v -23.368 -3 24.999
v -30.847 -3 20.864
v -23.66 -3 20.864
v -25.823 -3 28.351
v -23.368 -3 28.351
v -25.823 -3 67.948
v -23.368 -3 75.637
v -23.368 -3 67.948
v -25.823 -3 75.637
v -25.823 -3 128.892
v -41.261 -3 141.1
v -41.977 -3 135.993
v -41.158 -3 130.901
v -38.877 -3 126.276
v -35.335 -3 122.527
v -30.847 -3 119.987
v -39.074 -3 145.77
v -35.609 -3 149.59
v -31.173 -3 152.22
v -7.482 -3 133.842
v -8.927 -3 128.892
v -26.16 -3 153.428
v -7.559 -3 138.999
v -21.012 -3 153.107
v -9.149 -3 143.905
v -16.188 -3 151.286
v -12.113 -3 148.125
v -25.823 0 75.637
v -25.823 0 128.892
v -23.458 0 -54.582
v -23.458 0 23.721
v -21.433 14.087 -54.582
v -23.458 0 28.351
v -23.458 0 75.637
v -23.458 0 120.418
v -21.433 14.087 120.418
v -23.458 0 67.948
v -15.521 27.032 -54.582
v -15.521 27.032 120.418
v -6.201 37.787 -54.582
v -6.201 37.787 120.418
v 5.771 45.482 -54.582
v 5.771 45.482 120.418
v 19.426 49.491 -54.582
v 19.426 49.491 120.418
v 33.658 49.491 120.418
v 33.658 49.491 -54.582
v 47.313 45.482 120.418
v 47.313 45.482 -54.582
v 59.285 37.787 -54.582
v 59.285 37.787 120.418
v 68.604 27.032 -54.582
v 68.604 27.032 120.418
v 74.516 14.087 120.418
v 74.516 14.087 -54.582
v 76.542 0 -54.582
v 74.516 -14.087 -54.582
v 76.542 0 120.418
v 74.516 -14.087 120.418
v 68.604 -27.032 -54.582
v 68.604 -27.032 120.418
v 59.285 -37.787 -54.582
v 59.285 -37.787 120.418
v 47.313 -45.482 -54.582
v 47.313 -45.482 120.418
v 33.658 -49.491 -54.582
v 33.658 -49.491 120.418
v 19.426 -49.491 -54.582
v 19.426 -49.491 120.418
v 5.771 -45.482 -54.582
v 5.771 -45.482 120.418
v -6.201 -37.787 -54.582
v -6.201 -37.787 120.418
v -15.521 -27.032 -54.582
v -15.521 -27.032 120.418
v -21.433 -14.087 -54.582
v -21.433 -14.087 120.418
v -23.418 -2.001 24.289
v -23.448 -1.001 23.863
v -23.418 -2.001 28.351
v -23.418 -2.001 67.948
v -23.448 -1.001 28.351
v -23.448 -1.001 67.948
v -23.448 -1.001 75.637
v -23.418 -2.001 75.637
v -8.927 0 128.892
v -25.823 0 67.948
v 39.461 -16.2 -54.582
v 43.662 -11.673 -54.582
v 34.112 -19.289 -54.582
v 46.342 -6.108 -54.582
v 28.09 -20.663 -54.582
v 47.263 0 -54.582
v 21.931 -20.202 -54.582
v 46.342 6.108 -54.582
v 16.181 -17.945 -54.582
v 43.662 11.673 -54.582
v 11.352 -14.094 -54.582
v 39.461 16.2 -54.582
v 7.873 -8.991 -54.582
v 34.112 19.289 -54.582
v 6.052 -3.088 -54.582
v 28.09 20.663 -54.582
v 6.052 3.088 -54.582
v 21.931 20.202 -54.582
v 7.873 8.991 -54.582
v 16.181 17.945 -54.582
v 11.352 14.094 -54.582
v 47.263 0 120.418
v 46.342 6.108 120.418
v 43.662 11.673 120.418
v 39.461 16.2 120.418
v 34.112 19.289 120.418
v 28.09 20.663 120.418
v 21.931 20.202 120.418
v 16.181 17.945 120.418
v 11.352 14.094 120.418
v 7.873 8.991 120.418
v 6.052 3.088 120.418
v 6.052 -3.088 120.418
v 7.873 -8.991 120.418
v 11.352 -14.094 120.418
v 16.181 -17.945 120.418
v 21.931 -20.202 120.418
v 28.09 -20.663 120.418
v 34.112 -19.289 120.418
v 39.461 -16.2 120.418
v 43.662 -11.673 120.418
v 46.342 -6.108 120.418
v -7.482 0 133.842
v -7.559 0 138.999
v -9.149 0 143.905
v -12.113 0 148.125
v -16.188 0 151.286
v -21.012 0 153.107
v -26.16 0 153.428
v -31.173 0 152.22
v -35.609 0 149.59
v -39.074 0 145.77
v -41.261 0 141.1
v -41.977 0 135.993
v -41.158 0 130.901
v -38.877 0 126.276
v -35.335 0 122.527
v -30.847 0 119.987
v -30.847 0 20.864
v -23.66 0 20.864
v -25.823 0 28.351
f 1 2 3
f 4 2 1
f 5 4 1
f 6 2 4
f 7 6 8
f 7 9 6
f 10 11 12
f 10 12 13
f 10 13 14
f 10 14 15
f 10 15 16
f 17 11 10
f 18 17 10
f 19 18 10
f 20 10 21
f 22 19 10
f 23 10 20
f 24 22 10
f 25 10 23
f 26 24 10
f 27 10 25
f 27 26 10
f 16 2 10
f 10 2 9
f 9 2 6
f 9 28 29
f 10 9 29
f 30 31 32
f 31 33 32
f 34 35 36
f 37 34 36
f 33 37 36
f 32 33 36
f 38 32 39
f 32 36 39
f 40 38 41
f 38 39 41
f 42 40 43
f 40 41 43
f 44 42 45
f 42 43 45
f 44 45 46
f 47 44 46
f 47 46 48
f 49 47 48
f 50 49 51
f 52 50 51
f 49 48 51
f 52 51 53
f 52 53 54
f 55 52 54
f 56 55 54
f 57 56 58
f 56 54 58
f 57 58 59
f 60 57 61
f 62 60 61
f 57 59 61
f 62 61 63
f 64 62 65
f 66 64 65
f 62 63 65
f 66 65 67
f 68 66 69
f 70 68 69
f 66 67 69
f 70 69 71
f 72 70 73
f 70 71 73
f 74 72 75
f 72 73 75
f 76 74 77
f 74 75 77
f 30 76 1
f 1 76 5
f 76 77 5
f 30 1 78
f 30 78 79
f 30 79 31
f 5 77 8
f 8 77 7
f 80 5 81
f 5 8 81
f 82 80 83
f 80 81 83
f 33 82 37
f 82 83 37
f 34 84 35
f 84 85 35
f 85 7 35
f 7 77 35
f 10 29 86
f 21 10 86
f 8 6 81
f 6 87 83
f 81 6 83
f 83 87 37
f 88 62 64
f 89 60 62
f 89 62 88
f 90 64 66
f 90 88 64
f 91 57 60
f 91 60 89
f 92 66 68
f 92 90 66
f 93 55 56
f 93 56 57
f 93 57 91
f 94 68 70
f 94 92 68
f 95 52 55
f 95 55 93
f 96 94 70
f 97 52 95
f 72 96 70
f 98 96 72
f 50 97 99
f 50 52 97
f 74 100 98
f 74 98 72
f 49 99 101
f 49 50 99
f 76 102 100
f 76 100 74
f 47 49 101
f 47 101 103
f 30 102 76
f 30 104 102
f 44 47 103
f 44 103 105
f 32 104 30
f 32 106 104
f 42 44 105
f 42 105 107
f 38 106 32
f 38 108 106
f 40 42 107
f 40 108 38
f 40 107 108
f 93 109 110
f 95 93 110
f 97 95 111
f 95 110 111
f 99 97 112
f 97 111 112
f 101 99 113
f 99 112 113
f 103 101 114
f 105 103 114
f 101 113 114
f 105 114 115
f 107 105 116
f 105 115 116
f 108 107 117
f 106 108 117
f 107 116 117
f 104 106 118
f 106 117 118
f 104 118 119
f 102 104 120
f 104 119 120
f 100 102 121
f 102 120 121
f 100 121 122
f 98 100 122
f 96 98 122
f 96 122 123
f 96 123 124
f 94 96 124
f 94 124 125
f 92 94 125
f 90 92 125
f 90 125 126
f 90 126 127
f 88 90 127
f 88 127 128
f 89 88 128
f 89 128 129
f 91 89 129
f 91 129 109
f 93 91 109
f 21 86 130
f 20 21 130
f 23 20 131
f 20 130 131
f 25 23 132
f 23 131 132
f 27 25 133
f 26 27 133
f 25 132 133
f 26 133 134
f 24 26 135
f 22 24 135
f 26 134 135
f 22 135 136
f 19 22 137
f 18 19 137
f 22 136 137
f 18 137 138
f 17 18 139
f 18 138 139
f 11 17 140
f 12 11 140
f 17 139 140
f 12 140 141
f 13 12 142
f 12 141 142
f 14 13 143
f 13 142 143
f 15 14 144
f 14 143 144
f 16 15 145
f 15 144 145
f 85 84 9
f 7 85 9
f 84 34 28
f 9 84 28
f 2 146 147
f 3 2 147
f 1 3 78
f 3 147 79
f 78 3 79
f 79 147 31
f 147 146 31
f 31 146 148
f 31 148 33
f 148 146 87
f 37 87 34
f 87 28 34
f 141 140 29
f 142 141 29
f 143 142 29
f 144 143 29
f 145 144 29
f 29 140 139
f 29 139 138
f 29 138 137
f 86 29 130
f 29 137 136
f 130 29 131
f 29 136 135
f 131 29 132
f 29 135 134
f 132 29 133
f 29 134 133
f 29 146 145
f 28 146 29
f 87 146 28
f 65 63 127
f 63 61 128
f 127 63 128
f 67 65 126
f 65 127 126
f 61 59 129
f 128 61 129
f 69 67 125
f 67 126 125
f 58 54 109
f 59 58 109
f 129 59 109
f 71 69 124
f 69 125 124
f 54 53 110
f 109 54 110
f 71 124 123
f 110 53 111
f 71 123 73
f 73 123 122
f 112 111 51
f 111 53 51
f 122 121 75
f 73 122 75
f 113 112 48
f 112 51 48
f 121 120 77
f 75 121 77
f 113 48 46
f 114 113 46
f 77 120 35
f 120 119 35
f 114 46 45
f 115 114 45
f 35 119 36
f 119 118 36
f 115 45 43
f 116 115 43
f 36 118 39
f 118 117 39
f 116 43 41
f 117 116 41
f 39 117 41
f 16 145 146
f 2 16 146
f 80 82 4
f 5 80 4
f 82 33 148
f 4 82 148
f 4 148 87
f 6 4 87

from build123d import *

# Parameters (mm, degrees)
F0_W     = 50
F0_H     = 175
F2_R     = 20.721056
F3_DEPTH = 235
F5_DEPTH = 3


with BuildPart() as f1:
    # F0 (on Front) → F1 (revolve)
    with BuildSketch(Plane.XZ):
        with Locations((1.541793, 32.918449)):
            Rectangle(F0_W, F0_H)
    revolve(axis=Axis((26.541793, 0, 32.918449), (0, 0, -1)))

    # F2 (on face) → F3 (cut)
    with BuildSketch(Plane.XY.offset(120.418449)):
        with Locations((26.541793, 0)):
            Circle(F2_R)
    extrude(amount=-F3_DEPTH, mode=Mode.SUBTRACT)

    # F4 (on Front) → F5 (join)
    with BuildSketch(Plane.XZ):
        with BuildLine():
            Line((-30.847115, 20.86447), (-23.65957, 20.86447))
            Line((-23.65957, 20.86447), (-23.131855, 28.351171))
            Line((-23.131855, 28.351171), (-25.822921, 28.351171))
            Line((-25.822921, 28.351171), (-25.822921, 67.948289))
            Line((-25.822921, 67.948289), (-23.131855, 67.948289))
            Line((-23.131855, 67.948289), (-23.131855, 75.637057))
            Line((-23.131855, 75.637057), (-25.822921, 75.637057))
            Line((-25.822921, 75.637057), (-25.822921, 128.891826))
            Line((-25.822921, 128.891826), (-8.927411, 128.891826))
            ThreePointArc((-8.927411, 128.891826), (-31.173128, 152.219995), (-30.847115, 119.986951))
            Line((-30.847115, 119.986951), (-30.847115, 20.86447))
        make_face()
    extrude(amount=F5_DEPTH)


solid = f1.part
